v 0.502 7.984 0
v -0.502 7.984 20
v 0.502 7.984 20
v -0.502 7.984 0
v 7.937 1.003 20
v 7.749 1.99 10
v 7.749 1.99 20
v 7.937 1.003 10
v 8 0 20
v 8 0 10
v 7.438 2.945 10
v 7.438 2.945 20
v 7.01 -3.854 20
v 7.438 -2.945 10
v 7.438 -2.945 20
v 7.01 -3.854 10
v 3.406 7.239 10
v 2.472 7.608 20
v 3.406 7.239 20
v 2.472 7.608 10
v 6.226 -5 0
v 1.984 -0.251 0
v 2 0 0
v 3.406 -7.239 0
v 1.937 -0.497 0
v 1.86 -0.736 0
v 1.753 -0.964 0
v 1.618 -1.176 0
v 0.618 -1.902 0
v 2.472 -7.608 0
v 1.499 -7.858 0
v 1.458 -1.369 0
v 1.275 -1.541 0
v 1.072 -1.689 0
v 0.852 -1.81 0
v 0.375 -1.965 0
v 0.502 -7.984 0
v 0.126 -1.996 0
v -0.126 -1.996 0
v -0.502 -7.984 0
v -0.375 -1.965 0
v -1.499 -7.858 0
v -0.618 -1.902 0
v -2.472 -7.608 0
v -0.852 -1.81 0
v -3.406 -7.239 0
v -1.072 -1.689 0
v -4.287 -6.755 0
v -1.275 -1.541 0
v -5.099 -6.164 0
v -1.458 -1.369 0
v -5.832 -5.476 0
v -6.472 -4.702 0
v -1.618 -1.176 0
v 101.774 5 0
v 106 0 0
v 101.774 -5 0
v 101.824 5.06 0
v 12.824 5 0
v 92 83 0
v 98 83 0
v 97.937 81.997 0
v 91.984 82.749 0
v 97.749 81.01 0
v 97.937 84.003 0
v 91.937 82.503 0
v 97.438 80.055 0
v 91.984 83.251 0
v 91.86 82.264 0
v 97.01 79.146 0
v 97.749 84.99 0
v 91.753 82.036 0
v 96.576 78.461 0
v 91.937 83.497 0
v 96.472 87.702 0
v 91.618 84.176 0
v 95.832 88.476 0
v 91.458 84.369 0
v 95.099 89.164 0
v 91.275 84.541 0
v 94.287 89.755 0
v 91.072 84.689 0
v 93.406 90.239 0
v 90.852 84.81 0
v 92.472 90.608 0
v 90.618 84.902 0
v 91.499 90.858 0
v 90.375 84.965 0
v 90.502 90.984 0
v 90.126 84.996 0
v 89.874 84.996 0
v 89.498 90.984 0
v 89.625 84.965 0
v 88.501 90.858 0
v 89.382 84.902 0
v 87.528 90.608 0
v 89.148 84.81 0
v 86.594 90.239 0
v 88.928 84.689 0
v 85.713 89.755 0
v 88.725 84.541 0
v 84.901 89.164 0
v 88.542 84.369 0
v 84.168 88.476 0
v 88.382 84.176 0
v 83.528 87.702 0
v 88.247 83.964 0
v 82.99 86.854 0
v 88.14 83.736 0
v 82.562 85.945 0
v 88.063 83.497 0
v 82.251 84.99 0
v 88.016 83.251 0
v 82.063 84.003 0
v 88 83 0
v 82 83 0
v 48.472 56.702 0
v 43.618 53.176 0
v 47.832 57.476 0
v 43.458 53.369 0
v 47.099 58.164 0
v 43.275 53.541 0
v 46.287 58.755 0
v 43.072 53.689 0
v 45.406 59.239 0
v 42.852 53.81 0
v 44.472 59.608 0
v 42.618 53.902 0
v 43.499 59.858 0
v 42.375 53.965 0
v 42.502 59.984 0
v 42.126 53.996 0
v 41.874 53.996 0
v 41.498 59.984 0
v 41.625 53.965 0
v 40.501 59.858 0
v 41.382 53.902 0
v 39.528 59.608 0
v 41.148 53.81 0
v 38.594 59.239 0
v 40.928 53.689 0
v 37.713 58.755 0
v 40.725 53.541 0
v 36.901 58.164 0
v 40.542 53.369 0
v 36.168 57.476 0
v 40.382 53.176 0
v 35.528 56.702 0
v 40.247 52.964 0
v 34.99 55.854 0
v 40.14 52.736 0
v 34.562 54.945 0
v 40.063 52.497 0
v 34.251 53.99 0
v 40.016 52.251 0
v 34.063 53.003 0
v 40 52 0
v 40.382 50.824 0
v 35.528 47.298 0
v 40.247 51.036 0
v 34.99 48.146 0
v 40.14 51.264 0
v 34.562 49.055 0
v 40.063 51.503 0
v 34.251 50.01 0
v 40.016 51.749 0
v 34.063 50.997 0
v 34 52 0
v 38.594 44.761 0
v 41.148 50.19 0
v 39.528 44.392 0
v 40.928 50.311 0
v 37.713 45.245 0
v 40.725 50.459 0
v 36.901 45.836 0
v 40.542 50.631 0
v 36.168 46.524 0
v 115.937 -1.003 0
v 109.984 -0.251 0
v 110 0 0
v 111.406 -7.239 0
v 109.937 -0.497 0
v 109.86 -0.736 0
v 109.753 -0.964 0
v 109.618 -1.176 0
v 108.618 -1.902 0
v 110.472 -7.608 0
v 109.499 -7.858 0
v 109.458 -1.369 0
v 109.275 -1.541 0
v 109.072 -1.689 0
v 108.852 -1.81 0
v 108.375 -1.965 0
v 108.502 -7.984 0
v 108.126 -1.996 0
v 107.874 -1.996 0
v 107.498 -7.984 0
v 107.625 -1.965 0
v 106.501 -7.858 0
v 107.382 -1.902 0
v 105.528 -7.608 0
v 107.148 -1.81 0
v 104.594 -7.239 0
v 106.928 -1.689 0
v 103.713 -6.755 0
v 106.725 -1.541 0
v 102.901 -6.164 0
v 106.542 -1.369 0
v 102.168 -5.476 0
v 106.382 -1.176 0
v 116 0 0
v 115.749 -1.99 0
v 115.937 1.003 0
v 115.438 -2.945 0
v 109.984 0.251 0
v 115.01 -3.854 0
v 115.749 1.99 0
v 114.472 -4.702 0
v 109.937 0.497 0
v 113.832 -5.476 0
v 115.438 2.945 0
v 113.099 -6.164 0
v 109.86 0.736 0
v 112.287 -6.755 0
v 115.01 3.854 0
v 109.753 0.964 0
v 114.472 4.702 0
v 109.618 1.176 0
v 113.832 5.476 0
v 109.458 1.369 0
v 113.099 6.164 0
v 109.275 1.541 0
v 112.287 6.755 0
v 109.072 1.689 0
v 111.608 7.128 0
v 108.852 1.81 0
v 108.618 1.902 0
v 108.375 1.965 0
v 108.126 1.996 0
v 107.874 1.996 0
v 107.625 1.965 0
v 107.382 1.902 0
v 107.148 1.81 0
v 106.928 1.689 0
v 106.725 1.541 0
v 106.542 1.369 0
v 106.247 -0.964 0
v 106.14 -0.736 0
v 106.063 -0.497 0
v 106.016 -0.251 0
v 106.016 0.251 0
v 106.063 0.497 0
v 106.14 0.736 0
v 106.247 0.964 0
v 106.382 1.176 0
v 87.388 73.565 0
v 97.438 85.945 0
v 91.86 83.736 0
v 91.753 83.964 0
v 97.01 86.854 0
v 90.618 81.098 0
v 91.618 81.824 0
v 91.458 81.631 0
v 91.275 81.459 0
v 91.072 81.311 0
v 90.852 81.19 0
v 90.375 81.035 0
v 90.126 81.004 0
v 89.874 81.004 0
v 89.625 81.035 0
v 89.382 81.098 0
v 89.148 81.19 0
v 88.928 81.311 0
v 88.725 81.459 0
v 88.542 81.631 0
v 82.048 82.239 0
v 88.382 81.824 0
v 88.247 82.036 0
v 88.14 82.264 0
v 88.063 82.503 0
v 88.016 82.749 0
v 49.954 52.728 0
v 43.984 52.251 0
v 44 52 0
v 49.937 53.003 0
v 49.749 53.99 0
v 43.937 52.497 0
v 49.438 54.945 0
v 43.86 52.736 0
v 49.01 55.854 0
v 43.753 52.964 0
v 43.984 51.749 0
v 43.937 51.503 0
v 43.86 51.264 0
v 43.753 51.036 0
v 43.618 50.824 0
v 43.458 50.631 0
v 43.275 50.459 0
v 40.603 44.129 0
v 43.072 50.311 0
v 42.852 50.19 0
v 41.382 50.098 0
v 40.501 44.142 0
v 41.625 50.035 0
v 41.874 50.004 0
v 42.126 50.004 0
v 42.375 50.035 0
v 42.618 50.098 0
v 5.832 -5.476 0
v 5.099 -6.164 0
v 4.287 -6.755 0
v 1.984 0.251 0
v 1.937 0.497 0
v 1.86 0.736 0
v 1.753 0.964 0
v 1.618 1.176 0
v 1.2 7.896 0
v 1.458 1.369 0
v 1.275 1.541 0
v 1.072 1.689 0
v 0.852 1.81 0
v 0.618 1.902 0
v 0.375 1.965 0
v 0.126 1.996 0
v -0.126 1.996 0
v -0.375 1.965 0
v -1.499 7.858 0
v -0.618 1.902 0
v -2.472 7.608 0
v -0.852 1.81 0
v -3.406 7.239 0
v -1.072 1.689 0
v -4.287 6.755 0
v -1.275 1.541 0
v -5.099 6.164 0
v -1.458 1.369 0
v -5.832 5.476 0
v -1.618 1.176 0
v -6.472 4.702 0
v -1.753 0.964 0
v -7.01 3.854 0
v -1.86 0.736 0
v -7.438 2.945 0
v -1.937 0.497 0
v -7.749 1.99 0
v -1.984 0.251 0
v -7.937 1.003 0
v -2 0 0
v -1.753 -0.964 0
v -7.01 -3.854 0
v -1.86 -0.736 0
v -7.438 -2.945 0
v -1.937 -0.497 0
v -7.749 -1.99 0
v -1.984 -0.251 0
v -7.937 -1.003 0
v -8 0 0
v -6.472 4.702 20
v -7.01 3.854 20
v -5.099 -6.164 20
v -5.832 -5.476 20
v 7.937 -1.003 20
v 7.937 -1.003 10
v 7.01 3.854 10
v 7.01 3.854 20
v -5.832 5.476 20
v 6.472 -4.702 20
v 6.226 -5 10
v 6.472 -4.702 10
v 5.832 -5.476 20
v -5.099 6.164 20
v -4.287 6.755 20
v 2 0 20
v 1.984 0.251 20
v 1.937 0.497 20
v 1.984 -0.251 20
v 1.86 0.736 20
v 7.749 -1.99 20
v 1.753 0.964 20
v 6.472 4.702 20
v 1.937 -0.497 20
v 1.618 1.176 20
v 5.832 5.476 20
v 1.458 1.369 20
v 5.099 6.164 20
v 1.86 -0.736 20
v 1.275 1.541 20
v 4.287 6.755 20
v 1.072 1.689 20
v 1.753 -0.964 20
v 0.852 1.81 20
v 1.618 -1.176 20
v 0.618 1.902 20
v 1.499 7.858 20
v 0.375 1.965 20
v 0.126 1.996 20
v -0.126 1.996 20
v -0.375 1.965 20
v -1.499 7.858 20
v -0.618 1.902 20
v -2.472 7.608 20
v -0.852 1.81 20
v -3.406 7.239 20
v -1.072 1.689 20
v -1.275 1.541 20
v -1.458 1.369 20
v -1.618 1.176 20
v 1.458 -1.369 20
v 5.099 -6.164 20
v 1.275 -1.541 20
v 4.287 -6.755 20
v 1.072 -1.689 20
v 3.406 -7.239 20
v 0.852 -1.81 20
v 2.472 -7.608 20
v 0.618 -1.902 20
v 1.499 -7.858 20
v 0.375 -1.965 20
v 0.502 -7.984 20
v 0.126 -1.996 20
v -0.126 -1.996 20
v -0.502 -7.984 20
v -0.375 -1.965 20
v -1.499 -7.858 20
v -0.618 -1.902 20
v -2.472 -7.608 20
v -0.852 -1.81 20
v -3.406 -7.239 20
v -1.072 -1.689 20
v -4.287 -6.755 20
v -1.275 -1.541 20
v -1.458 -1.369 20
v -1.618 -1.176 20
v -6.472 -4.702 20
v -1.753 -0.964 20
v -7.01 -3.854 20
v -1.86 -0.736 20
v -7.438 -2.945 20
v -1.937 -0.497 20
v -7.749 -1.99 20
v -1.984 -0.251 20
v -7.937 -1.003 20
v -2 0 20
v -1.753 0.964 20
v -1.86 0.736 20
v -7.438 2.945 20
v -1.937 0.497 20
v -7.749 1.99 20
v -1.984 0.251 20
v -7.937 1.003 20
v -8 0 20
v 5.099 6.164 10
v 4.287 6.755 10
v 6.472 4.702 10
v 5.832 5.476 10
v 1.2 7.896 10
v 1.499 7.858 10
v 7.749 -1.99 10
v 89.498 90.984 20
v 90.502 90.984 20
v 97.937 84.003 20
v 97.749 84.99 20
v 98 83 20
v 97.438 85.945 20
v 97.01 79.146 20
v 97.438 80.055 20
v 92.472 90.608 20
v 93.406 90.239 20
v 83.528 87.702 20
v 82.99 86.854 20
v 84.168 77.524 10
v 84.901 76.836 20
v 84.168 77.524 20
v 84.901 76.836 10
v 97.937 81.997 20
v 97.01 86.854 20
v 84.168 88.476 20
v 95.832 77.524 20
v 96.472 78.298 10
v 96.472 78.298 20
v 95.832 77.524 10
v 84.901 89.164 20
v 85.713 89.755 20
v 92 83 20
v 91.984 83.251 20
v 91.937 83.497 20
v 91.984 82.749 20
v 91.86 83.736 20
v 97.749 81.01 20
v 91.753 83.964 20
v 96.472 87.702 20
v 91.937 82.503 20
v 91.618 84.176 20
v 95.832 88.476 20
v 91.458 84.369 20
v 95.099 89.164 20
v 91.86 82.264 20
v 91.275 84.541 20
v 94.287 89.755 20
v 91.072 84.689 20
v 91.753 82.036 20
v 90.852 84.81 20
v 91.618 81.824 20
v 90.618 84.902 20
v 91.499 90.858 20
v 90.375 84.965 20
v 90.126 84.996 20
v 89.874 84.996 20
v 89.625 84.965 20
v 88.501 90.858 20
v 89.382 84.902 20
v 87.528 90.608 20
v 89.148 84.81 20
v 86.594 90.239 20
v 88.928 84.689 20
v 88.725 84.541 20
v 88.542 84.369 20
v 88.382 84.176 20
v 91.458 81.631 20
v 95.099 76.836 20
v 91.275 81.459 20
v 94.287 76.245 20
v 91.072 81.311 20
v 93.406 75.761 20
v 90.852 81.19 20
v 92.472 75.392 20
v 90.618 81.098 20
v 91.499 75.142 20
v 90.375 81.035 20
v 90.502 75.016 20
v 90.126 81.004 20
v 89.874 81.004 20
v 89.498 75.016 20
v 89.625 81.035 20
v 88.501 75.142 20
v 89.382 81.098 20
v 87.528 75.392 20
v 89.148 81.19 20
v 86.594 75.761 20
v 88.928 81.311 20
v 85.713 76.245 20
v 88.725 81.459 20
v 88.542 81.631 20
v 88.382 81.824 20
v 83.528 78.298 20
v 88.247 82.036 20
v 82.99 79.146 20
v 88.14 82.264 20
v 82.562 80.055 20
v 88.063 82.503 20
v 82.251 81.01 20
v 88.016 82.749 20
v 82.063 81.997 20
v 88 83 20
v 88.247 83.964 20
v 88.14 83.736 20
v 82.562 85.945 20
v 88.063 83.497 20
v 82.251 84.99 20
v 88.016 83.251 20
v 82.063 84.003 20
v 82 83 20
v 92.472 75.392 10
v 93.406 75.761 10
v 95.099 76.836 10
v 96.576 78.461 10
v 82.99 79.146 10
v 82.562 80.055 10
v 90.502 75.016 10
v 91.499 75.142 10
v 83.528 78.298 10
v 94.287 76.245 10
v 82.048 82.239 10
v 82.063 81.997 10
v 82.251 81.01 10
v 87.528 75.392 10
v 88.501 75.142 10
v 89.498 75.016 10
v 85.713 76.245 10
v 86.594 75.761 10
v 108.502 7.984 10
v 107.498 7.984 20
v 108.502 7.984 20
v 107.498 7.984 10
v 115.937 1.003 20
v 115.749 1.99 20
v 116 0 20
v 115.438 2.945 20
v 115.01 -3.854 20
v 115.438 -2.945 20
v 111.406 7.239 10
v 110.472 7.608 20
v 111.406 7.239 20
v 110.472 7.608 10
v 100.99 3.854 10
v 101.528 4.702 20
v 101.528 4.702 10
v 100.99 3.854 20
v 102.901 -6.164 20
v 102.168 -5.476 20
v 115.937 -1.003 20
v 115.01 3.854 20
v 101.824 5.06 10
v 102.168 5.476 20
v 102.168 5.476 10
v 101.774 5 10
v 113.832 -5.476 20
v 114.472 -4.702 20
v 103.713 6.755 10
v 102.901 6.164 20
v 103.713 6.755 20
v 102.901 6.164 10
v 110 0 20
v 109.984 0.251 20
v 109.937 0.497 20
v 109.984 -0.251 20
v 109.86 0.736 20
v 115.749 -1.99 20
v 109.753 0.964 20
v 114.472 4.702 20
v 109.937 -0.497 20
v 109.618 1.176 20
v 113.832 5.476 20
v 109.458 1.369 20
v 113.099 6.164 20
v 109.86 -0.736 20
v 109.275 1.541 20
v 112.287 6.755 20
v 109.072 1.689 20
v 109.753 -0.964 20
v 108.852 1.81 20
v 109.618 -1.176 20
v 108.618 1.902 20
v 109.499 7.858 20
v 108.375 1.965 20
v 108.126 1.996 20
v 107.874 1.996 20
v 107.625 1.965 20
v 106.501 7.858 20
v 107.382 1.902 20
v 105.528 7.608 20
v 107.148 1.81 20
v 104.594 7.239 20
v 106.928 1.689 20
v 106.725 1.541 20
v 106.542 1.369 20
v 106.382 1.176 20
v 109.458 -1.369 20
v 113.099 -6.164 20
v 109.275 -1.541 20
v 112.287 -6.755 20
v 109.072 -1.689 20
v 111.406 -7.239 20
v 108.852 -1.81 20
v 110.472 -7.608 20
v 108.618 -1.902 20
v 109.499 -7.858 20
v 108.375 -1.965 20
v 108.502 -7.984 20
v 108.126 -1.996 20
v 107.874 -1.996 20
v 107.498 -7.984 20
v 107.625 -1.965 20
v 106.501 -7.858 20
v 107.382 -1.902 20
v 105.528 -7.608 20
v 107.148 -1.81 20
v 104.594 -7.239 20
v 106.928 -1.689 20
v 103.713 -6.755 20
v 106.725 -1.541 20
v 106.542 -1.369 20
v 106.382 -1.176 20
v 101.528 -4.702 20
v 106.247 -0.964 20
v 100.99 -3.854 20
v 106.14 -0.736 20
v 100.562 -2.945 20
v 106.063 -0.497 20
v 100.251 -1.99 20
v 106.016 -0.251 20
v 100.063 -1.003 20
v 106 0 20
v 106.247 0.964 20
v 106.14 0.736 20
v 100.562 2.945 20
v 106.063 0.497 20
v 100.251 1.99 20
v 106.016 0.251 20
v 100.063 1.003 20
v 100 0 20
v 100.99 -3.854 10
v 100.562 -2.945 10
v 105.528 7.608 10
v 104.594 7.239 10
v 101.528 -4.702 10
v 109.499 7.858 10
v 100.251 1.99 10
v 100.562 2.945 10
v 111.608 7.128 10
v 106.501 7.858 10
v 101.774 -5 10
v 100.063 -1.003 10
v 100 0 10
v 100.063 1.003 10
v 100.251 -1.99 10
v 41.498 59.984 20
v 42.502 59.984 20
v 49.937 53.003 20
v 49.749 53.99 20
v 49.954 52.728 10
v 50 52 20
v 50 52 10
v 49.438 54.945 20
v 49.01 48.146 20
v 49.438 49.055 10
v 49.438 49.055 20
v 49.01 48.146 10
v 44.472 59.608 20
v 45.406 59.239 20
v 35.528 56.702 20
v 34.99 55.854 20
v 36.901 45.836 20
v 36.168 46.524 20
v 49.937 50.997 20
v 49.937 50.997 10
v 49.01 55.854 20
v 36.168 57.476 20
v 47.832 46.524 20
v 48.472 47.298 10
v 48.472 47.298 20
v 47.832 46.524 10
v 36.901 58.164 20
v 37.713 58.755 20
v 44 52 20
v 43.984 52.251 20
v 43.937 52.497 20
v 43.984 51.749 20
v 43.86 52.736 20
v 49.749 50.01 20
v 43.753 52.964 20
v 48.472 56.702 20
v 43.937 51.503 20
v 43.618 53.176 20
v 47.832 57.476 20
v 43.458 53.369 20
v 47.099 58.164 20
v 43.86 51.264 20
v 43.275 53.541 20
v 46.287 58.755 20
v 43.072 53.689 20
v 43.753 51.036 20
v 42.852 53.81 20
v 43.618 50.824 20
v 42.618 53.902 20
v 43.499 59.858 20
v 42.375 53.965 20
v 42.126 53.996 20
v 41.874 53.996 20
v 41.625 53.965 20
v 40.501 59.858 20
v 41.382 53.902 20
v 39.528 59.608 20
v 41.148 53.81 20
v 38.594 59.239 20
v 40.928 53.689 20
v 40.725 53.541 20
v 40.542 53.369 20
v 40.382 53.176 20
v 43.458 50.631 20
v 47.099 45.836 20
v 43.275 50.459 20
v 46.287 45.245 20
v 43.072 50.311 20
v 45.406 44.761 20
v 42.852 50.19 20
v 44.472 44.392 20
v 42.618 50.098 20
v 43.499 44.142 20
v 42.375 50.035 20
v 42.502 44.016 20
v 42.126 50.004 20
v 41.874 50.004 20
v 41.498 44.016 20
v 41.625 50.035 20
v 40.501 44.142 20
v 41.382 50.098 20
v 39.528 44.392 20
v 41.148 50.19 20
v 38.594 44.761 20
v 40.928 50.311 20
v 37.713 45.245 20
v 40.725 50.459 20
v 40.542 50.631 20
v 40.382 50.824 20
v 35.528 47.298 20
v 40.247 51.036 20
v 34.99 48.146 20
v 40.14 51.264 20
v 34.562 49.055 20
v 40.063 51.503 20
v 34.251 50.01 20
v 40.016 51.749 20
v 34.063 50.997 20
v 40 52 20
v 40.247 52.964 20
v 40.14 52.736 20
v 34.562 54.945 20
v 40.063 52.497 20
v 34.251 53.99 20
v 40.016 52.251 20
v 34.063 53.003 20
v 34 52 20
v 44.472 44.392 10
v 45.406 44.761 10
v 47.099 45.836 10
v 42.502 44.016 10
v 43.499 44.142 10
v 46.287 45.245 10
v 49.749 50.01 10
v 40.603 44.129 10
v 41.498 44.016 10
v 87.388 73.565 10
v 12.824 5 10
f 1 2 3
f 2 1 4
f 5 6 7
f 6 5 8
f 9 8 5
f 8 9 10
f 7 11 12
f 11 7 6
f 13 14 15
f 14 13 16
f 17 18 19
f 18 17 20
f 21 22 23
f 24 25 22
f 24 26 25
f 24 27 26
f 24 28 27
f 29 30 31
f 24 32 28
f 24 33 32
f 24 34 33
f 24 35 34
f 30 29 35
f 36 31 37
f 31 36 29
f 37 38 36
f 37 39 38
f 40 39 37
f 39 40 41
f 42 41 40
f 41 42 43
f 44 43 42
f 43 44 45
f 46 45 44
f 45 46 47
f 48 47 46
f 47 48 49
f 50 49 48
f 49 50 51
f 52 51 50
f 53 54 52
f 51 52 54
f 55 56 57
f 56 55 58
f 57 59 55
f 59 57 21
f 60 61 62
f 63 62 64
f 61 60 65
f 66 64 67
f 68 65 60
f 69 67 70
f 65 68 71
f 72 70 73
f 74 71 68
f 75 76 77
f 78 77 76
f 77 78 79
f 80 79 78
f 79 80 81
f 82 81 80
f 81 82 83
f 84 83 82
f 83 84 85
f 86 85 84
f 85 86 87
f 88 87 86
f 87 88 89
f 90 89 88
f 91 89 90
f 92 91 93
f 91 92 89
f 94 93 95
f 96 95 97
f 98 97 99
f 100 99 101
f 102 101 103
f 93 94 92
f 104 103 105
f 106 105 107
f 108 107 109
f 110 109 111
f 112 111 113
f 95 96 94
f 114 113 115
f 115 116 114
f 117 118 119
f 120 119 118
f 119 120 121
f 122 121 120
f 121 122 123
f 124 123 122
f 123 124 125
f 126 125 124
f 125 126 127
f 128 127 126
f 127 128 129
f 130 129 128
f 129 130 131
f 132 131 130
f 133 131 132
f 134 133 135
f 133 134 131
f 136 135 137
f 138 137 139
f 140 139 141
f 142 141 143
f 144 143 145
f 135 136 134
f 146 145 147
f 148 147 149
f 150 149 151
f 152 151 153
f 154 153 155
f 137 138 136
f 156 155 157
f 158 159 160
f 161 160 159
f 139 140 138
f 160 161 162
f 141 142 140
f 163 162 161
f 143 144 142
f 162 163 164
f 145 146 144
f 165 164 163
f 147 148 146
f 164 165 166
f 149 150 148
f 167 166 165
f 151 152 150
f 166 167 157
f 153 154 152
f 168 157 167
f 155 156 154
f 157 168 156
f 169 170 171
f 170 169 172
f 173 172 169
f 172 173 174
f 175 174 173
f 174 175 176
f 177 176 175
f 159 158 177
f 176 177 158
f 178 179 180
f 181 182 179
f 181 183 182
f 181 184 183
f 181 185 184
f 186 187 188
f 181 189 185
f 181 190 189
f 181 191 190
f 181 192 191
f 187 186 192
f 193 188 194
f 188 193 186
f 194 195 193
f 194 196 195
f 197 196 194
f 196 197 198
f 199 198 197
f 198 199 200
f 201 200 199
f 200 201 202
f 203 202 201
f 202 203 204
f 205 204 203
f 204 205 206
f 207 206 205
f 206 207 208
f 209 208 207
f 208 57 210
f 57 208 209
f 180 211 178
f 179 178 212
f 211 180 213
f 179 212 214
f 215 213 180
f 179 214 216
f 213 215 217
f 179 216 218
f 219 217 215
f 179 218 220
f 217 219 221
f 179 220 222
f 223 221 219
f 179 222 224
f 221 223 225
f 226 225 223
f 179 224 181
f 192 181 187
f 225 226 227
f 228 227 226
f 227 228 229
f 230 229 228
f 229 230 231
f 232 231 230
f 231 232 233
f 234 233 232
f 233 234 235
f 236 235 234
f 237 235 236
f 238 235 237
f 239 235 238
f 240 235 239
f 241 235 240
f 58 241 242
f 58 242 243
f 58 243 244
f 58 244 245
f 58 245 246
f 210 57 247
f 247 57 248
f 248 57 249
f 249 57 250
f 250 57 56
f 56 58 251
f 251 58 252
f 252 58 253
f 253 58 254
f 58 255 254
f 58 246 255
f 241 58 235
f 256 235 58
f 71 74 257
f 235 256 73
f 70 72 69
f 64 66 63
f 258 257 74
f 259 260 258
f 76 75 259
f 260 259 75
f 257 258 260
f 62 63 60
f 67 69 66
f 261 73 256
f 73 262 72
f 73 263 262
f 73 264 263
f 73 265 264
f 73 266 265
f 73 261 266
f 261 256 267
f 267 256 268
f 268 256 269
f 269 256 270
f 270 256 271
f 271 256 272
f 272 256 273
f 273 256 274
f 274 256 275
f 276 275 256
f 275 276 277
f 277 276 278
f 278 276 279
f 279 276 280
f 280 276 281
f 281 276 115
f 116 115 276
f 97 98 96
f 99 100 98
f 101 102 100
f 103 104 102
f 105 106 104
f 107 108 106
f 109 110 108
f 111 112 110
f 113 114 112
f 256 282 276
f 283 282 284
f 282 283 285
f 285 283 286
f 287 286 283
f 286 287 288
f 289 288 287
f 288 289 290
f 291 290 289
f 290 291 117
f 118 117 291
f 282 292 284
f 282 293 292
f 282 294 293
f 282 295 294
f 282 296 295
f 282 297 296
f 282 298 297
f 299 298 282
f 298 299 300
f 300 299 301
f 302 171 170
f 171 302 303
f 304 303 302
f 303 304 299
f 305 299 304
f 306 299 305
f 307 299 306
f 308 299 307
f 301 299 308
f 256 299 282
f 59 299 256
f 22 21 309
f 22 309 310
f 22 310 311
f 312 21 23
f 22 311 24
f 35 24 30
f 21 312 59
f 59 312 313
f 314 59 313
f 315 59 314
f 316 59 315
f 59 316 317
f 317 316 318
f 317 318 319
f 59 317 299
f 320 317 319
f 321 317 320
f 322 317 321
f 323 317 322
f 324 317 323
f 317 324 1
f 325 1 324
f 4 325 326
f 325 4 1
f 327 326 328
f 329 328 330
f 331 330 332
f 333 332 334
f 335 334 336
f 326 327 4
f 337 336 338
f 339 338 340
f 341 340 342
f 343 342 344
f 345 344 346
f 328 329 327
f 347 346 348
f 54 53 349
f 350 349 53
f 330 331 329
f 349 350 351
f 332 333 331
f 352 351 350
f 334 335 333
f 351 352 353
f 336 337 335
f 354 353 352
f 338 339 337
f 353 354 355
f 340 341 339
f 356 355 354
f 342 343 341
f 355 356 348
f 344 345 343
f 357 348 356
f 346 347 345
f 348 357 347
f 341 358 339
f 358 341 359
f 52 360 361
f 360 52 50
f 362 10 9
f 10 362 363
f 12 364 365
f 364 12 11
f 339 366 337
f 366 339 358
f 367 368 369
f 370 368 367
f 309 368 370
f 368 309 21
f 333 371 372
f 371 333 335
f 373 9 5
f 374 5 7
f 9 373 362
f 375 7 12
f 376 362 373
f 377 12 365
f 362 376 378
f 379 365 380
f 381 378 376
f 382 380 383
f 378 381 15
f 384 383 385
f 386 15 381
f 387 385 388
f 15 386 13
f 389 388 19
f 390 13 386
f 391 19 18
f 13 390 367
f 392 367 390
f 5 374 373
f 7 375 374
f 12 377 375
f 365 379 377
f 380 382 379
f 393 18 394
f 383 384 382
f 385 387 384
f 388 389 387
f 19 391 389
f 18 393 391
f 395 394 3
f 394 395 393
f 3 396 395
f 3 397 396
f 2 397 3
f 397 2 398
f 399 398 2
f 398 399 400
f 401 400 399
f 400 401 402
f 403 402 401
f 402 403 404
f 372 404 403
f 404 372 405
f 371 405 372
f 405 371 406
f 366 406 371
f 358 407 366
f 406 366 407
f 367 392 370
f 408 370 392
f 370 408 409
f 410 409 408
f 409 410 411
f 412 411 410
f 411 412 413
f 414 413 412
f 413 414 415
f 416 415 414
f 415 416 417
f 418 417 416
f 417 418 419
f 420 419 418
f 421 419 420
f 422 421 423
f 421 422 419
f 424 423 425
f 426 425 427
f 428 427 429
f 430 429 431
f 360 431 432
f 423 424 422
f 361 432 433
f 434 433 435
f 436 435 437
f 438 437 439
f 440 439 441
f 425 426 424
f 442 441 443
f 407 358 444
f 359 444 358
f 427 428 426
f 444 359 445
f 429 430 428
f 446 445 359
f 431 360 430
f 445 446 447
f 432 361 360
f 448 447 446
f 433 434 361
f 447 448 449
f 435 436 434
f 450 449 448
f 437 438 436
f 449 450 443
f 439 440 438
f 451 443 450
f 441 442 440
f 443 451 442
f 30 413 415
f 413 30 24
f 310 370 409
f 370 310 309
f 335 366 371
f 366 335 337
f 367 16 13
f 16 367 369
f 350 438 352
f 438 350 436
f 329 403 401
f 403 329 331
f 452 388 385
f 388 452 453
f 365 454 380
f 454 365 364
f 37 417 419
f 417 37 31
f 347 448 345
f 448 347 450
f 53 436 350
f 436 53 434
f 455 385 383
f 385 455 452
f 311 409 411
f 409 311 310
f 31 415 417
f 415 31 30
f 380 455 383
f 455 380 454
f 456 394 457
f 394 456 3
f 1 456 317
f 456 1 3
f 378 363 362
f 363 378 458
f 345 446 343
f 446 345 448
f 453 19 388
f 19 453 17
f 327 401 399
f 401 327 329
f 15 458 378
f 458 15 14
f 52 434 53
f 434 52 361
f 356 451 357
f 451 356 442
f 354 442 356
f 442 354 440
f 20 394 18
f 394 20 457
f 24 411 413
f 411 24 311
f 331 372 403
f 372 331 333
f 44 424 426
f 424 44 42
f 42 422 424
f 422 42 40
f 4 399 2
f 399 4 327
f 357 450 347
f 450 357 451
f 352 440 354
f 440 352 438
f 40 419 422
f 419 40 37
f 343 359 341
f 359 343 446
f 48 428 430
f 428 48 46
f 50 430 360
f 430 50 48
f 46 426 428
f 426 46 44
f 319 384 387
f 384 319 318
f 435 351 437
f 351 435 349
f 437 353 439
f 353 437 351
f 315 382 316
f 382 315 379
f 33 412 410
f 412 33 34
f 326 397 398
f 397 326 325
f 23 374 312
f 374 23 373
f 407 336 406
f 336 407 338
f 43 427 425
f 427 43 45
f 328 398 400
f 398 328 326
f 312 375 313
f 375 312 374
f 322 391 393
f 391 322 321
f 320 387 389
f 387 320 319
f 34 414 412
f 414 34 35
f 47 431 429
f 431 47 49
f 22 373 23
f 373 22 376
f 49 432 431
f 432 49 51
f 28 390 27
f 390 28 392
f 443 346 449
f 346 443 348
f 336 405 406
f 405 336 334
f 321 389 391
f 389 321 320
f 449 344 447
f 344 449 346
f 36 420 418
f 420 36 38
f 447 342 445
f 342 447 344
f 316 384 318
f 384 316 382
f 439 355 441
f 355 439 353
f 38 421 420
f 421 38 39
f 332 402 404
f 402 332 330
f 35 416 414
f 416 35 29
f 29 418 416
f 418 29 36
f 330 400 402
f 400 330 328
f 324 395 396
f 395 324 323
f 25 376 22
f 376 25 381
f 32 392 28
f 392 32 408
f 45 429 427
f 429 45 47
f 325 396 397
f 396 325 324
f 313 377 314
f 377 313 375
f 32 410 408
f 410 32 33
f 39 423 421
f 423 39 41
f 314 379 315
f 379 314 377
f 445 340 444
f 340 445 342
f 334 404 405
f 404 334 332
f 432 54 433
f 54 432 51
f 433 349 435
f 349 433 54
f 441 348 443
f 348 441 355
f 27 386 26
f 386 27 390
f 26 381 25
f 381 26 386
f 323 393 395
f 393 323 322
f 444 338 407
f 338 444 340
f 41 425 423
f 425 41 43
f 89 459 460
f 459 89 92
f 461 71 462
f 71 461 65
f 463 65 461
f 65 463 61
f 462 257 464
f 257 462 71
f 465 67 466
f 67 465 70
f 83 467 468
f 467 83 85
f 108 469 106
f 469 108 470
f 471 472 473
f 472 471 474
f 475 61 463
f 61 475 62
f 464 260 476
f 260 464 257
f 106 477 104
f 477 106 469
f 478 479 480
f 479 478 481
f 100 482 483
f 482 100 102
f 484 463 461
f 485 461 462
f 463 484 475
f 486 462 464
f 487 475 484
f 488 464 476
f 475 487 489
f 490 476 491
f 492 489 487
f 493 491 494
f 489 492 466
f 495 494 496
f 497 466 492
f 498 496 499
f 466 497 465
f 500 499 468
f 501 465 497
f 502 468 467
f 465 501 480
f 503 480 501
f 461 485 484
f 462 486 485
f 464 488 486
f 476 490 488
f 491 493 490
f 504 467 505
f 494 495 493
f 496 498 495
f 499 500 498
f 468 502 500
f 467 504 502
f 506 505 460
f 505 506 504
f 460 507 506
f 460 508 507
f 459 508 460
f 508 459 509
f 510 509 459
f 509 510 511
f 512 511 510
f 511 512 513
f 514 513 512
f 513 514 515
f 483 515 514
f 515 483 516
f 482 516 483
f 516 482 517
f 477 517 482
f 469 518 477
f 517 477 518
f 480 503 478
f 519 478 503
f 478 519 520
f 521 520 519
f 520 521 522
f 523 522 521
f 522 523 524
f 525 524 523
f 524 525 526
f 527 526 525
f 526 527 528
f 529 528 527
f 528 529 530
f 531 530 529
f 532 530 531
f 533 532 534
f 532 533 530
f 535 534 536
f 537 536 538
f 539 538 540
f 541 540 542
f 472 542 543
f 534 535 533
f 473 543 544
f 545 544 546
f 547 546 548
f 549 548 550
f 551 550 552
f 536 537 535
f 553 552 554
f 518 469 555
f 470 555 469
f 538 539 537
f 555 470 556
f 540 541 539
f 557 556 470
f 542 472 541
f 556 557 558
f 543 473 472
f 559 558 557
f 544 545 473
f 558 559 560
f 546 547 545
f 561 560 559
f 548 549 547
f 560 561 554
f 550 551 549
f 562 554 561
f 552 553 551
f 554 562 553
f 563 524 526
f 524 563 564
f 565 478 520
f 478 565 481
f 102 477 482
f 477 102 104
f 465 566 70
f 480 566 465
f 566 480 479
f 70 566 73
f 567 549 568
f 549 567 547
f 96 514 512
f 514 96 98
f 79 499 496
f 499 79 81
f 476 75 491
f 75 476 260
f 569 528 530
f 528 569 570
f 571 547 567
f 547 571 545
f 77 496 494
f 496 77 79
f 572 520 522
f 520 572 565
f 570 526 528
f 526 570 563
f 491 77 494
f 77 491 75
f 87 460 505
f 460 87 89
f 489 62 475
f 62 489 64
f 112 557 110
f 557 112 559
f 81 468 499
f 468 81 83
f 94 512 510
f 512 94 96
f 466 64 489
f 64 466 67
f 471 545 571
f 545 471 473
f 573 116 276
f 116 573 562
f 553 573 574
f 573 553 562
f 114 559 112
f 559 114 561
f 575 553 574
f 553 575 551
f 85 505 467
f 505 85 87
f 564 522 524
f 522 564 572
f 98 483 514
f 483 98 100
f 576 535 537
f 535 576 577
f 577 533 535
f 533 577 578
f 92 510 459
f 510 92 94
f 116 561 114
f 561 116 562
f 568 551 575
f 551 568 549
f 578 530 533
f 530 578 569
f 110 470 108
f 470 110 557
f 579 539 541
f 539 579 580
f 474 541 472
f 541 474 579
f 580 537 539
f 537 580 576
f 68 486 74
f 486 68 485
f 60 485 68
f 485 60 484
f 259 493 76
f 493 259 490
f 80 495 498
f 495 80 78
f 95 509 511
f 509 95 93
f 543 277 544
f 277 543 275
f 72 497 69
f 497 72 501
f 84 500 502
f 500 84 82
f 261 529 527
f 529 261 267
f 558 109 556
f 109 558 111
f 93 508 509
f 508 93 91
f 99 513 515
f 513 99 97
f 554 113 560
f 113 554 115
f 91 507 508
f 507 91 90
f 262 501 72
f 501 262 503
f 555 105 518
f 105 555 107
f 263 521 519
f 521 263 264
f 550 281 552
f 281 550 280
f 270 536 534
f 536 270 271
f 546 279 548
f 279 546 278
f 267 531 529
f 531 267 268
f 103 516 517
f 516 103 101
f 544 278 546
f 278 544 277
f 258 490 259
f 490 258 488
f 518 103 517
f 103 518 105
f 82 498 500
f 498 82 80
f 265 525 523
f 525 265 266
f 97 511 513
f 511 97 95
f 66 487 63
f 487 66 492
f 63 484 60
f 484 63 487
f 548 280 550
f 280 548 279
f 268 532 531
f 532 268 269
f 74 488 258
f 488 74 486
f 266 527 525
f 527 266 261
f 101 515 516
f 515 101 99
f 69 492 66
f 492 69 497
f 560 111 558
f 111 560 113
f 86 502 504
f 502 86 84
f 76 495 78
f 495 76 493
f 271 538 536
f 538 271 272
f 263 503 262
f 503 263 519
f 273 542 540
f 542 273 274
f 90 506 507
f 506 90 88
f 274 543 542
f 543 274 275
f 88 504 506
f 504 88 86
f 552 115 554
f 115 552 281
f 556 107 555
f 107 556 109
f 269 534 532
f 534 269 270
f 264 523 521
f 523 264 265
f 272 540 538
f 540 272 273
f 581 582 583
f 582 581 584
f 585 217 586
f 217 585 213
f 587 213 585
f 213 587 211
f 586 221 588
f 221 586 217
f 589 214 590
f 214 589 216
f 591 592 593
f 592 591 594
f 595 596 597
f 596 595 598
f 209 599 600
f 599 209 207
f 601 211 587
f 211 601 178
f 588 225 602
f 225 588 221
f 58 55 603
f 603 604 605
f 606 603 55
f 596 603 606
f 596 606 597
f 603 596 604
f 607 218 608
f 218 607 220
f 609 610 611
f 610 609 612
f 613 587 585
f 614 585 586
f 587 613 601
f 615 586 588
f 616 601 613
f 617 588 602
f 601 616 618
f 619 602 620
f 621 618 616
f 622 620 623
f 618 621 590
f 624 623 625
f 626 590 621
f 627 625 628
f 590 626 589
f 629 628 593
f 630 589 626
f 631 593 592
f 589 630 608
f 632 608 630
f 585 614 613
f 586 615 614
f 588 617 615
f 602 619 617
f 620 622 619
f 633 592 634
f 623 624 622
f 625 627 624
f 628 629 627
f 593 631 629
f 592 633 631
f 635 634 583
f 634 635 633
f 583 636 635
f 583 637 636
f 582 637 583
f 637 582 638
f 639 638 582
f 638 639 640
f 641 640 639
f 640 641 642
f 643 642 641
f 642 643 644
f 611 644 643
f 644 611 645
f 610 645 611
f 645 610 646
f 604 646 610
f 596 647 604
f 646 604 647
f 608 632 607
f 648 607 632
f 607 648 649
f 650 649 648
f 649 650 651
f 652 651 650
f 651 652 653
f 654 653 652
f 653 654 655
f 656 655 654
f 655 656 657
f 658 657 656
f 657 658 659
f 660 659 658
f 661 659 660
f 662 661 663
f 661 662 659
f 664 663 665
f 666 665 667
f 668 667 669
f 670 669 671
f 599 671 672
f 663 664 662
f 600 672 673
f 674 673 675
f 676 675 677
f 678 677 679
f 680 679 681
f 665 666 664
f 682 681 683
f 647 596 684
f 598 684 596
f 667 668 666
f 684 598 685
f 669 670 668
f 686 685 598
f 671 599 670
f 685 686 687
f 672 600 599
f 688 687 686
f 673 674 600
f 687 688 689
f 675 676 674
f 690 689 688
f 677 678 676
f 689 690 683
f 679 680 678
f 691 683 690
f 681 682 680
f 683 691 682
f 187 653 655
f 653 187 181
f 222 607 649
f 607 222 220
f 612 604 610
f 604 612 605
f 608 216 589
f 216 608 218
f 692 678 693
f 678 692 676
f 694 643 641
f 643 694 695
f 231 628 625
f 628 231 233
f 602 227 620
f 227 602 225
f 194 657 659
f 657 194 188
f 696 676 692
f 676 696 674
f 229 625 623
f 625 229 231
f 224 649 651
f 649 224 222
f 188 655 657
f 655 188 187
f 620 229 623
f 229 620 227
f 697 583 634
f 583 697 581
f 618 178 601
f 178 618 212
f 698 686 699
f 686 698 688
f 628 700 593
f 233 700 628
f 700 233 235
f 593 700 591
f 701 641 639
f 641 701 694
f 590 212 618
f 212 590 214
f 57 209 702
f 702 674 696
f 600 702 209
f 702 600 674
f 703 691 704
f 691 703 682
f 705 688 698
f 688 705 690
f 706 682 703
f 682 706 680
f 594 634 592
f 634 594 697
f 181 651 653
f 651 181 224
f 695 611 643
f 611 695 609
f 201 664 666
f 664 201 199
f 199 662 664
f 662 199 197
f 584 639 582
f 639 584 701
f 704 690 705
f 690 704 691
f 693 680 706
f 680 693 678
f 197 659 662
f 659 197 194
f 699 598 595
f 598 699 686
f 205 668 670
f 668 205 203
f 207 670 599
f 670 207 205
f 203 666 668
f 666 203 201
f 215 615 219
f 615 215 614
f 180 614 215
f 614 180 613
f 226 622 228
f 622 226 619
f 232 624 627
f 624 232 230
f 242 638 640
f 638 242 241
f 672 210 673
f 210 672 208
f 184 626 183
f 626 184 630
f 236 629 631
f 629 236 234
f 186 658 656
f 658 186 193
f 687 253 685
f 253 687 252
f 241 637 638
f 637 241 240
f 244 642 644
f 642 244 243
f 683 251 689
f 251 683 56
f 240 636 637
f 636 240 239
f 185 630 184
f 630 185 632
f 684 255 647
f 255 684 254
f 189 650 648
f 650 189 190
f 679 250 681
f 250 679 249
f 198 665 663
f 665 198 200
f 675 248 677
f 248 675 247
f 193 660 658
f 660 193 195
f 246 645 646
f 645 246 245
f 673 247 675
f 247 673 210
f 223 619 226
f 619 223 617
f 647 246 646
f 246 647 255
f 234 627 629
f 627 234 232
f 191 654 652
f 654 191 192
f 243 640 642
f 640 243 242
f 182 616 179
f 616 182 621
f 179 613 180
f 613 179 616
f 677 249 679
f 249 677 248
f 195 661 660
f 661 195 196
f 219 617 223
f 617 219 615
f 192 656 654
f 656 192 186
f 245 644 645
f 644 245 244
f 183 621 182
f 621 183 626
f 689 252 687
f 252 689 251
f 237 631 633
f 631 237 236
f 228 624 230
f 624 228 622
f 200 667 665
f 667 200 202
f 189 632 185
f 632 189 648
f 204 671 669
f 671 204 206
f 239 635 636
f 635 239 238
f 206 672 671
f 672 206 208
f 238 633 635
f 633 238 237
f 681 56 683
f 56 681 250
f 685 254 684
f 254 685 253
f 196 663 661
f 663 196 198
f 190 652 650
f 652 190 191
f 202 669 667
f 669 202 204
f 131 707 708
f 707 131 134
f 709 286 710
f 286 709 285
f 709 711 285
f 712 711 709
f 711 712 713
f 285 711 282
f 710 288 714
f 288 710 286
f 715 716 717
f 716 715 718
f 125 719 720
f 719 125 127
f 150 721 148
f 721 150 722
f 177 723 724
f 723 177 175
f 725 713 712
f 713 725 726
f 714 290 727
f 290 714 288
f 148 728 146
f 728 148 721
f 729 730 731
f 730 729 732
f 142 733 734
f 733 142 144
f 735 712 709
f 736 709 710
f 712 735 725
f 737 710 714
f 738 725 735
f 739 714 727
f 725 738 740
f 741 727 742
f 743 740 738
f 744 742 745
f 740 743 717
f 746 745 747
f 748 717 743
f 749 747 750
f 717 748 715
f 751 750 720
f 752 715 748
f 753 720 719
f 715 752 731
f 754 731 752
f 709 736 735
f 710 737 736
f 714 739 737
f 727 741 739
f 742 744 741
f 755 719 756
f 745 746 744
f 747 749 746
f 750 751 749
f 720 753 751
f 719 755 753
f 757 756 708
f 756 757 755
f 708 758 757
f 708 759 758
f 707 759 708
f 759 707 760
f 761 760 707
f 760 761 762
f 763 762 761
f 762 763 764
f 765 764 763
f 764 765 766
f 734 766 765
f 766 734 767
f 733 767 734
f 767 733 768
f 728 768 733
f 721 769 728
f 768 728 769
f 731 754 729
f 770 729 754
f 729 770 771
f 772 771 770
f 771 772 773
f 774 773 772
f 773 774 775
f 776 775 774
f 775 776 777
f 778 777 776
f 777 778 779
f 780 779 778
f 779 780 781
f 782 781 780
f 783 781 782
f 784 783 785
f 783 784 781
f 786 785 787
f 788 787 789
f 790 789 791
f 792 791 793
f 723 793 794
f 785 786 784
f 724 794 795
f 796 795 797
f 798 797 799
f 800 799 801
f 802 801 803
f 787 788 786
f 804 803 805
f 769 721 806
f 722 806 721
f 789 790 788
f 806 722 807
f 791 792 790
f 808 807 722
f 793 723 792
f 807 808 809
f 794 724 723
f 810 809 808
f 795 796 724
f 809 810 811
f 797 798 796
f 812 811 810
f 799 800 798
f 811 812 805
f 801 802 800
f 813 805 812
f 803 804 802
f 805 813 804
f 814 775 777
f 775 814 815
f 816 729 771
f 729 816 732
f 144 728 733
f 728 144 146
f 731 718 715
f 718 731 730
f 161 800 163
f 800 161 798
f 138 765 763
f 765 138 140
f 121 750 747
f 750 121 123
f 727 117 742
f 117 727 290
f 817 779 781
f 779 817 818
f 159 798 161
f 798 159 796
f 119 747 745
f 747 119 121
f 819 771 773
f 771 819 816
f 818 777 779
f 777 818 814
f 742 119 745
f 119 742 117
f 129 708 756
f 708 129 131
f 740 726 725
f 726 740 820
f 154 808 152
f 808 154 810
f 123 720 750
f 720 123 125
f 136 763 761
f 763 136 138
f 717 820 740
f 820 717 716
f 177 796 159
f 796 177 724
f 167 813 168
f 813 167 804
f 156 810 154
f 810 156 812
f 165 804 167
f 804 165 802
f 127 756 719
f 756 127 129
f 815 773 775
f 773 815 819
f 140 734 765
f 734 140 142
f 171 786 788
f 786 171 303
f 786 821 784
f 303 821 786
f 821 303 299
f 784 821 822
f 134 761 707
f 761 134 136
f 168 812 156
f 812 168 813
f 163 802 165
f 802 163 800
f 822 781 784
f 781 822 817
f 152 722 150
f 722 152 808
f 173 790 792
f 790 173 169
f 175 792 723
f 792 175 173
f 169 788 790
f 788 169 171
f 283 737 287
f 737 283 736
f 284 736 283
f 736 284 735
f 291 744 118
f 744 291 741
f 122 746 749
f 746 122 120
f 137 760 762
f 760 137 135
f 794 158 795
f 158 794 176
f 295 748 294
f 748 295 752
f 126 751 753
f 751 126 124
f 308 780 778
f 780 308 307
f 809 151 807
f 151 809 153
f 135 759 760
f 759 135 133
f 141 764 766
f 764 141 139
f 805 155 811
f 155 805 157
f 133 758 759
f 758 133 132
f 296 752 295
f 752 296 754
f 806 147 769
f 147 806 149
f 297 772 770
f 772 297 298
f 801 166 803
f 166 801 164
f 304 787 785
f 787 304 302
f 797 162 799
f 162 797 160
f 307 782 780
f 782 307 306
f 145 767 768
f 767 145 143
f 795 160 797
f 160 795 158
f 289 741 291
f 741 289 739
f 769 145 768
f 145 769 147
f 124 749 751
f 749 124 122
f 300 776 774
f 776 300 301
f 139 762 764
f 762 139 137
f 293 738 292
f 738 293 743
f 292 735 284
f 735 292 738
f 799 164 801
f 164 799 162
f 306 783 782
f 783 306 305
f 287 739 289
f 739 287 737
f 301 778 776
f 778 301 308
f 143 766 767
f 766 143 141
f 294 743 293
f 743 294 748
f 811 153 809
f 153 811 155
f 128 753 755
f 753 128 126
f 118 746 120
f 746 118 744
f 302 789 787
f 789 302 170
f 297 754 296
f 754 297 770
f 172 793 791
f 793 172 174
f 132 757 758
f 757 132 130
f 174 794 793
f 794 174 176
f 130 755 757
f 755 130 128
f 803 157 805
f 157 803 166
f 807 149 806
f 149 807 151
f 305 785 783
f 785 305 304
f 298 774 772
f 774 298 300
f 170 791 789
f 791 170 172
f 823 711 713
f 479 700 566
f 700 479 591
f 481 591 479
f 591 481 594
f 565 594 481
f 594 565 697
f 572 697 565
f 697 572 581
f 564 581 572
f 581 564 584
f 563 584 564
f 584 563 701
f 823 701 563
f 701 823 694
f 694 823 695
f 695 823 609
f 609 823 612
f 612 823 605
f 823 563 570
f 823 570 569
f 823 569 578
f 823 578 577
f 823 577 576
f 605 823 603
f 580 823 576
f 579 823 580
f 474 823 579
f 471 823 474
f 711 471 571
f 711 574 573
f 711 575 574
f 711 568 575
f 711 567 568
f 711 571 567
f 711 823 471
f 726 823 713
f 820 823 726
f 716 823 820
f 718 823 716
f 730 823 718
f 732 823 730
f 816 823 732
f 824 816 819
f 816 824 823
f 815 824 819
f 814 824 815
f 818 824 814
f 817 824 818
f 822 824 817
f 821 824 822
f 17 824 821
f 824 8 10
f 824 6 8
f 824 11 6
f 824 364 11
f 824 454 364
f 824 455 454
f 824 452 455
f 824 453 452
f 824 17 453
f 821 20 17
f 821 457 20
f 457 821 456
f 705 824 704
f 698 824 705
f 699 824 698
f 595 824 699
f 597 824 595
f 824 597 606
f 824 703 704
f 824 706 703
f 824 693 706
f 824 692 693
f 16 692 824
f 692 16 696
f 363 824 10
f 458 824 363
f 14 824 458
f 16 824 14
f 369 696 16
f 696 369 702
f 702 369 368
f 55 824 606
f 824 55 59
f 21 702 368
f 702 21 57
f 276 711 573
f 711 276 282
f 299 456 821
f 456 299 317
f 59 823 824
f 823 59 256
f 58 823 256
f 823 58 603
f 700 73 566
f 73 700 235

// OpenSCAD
scale([1,1,2.5]){
$fn=50;

difference(){
cylinder(d=16,h=8);
translate([0,0,-1])cylinder(d=4,h=10);
}
translate([90,83,0])
difference(){
cylinder(d=16,h=8);
translate([0,0,-1])cylinder(d=4,h=10);
}
translate([108,0,0])
difference(){
cylinder(d=16,h=8);
translate([0,0,-1])cylinder(d=4,h=10);
}
translate([42,52,0])
difference(){
cylinder(d=16,h=8);
translate([0,0,-1])cylinder(d=4,h=10);
}

translate([3,-5,0])cube([102,10,4]);

rotate([0,0,42.6])
translate([3,-5,0])cube([116,10,4]);

translate([108,0,0])rotate([0,0,101.9])
translate([3,-5,0])cube([78,10,4]);
}
